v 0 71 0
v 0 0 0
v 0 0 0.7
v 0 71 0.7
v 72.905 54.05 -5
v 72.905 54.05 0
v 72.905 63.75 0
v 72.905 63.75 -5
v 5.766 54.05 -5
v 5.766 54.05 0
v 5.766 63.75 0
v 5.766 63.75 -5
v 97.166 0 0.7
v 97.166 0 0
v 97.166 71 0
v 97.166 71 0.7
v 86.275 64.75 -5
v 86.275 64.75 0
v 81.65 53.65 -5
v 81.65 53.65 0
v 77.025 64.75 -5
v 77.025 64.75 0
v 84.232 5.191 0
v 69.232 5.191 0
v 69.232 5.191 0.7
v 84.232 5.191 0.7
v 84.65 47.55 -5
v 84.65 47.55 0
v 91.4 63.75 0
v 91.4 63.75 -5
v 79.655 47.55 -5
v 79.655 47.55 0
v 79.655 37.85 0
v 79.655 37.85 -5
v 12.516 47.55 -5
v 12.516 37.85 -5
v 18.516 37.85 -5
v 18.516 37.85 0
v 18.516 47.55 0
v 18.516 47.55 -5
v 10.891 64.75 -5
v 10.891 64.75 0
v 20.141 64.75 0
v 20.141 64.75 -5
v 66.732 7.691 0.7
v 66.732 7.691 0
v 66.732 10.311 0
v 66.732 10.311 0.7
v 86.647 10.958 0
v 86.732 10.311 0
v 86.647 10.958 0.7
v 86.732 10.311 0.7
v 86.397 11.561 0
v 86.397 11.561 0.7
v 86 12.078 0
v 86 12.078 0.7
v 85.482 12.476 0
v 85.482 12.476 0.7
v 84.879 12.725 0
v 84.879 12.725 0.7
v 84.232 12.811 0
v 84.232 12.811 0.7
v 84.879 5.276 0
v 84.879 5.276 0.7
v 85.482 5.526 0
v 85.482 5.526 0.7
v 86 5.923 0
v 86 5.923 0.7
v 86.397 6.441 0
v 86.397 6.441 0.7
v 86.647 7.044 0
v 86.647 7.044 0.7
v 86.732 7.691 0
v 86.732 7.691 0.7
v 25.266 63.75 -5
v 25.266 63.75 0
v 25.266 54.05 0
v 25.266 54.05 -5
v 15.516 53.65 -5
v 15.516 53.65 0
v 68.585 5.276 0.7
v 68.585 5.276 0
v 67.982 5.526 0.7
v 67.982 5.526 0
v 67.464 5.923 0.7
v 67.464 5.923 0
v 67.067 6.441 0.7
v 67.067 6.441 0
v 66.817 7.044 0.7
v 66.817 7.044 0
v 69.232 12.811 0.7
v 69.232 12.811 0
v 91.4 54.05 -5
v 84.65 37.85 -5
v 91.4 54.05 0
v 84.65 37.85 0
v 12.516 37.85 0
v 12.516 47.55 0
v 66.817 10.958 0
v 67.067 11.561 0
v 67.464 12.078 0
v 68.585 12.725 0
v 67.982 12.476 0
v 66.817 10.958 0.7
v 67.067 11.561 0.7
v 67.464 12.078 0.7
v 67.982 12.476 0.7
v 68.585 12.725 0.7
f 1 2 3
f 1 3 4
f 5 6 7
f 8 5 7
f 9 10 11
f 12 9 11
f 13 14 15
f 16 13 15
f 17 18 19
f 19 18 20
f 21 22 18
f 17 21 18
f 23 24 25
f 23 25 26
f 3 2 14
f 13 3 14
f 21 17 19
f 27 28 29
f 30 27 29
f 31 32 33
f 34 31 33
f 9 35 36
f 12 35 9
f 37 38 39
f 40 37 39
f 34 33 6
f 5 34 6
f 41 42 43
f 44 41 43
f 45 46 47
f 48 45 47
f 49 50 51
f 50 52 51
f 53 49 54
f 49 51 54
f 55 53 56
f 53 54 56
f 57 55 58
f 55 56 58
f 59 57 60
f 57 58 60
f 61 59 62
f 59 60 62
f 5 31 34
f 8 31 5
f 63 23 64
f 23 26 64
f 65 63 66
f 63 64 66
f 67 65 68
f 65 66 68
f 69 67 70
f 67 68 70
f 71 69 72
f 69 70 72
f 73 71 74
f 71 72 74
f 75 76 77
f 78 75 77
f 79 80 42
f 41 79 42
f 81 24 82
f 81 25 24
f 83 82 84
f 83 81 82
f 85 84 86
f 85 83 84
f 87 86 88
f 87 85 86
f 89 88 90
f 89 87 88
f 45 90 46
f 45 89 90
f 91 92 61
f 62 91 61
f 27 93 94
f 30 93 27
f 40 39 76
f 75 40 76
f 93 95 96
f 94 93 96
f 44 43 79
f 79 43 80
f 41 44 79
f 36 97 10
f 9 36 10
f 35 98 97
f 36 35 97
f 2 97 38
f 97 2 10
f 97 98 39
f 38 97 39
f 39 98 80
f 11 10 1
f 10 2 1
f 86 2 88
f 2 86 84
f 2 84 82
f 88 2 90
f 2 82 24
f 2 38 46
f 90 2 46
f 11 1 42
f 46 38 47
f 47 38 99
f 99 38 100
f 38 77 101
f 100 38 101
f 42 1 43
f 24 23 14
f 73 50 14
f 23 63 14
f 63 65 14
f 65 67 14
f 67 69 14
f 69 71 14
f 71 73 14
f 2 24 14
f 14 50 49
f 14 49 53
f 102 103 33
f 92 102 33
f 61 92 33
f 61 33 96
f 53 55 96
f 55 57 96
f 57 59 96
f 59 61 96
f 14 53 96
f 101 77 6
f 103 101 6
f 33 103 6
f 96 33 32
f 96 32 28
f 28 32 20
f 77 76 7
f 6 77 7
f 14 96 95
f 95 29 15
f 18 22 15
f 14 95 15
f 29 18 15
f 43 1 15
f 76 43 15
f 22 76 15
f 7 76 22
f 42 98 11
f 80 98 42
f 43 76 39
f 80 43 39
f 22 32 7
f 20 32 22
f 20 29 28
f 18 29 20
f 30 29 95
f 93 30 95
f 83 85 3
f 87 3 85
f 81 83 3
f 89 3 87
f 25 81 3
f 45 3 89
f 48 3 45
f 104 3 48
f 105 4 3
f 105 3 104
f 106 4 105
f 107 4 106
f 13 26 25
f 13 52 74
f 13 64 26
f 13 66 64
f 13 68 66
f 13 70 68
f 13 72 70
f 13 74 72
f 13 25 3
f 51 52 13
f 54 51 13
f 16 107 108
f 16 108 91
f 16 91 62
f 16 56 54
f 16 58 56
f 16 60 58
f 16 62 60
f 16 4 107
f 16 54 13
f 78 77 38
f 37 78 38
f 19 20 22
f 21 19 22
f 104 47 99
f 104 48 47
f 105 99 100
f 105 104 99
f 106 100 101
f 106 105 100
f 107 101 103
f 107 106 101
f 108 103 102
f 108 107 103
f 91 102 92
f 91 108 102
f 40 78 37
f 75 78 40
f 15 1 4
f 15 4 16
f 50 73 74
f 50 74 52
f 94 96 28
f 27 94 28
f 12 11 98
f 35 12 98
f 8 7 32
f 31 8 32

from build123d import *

# Parameters (mm, degrees)
SKETCH1_W           = 97.16644
SKETCH1_H           = 71
SKETCH1_W_2         = 20
SKETCH1_H_2         = 7.62
BOSS_EXTRUDE2_DEPTH = 0.7
BOSS_EXTRUDE3_DEPTH = 5
FILLET1_R           = 2.5


with BuildPart() as part:
    # Sketch1 → Boss-Extrude2 (new body)
    with BuildSketch(Plane.XY):
        with Locations((48.58322, 35.5)):
            Rectangle(SKETCH1_W, SKETCH1_H)
        with Locations((76.731936, 9.000673)):
            Rectangle(SKETCH1_W_2, SKETCH1_H_2, mode=Mode.SUBTRACT)
    extrude(amount=BOSS_EXTRUDE2_DEPTH)

    # Sketch1<4> → Boss-Extrude3 (add)
    with BuildSketch(Plane.XY):
        Polygon((25.266348, 63.75), (18.516348, 47.55), (18.516348, 37.85), (25.266348, 54.05), align=None)
        Polygon((10.891348, 64.75), (15.516348, 53.65), (20.141348, 64.75), align=None)
        Polygon((5.766348, 63.75), (5.766348, 54.05), (12.516348, 37.85), (12.516348, 47.55), align=None)
        Polygon((72.904973, 54.05), (79.654973, 37.85), (79.654973, 47.55), (72.904973, 63.75), align=None)
        Polygon((77.025092, 64.75), (81.650092, 53.65), (86.275092, 64.75), align=None)
        Polygon((91.400092, 63.75), (84.650092, 47.55), (84.650092, 37.85), (91.400092, 54.05), align=None)
    extrude(amount=-BOSS_EXTRUDE3_DEPTH)

    # Fillet1
    fillet1_edges = [part.edges().sort_by_distance(p)[0] for p in [
        (66.731936, 5.190673, 0.35),
        (66.731936, 12.810673, 0.35),
        (86.731936, 12.810673, 0.35),
        (86.731936, 5.190673, 0.35),
    ]]
    fillet(fillet1_edges, radius=FILLET1_R)


solid = part.part
